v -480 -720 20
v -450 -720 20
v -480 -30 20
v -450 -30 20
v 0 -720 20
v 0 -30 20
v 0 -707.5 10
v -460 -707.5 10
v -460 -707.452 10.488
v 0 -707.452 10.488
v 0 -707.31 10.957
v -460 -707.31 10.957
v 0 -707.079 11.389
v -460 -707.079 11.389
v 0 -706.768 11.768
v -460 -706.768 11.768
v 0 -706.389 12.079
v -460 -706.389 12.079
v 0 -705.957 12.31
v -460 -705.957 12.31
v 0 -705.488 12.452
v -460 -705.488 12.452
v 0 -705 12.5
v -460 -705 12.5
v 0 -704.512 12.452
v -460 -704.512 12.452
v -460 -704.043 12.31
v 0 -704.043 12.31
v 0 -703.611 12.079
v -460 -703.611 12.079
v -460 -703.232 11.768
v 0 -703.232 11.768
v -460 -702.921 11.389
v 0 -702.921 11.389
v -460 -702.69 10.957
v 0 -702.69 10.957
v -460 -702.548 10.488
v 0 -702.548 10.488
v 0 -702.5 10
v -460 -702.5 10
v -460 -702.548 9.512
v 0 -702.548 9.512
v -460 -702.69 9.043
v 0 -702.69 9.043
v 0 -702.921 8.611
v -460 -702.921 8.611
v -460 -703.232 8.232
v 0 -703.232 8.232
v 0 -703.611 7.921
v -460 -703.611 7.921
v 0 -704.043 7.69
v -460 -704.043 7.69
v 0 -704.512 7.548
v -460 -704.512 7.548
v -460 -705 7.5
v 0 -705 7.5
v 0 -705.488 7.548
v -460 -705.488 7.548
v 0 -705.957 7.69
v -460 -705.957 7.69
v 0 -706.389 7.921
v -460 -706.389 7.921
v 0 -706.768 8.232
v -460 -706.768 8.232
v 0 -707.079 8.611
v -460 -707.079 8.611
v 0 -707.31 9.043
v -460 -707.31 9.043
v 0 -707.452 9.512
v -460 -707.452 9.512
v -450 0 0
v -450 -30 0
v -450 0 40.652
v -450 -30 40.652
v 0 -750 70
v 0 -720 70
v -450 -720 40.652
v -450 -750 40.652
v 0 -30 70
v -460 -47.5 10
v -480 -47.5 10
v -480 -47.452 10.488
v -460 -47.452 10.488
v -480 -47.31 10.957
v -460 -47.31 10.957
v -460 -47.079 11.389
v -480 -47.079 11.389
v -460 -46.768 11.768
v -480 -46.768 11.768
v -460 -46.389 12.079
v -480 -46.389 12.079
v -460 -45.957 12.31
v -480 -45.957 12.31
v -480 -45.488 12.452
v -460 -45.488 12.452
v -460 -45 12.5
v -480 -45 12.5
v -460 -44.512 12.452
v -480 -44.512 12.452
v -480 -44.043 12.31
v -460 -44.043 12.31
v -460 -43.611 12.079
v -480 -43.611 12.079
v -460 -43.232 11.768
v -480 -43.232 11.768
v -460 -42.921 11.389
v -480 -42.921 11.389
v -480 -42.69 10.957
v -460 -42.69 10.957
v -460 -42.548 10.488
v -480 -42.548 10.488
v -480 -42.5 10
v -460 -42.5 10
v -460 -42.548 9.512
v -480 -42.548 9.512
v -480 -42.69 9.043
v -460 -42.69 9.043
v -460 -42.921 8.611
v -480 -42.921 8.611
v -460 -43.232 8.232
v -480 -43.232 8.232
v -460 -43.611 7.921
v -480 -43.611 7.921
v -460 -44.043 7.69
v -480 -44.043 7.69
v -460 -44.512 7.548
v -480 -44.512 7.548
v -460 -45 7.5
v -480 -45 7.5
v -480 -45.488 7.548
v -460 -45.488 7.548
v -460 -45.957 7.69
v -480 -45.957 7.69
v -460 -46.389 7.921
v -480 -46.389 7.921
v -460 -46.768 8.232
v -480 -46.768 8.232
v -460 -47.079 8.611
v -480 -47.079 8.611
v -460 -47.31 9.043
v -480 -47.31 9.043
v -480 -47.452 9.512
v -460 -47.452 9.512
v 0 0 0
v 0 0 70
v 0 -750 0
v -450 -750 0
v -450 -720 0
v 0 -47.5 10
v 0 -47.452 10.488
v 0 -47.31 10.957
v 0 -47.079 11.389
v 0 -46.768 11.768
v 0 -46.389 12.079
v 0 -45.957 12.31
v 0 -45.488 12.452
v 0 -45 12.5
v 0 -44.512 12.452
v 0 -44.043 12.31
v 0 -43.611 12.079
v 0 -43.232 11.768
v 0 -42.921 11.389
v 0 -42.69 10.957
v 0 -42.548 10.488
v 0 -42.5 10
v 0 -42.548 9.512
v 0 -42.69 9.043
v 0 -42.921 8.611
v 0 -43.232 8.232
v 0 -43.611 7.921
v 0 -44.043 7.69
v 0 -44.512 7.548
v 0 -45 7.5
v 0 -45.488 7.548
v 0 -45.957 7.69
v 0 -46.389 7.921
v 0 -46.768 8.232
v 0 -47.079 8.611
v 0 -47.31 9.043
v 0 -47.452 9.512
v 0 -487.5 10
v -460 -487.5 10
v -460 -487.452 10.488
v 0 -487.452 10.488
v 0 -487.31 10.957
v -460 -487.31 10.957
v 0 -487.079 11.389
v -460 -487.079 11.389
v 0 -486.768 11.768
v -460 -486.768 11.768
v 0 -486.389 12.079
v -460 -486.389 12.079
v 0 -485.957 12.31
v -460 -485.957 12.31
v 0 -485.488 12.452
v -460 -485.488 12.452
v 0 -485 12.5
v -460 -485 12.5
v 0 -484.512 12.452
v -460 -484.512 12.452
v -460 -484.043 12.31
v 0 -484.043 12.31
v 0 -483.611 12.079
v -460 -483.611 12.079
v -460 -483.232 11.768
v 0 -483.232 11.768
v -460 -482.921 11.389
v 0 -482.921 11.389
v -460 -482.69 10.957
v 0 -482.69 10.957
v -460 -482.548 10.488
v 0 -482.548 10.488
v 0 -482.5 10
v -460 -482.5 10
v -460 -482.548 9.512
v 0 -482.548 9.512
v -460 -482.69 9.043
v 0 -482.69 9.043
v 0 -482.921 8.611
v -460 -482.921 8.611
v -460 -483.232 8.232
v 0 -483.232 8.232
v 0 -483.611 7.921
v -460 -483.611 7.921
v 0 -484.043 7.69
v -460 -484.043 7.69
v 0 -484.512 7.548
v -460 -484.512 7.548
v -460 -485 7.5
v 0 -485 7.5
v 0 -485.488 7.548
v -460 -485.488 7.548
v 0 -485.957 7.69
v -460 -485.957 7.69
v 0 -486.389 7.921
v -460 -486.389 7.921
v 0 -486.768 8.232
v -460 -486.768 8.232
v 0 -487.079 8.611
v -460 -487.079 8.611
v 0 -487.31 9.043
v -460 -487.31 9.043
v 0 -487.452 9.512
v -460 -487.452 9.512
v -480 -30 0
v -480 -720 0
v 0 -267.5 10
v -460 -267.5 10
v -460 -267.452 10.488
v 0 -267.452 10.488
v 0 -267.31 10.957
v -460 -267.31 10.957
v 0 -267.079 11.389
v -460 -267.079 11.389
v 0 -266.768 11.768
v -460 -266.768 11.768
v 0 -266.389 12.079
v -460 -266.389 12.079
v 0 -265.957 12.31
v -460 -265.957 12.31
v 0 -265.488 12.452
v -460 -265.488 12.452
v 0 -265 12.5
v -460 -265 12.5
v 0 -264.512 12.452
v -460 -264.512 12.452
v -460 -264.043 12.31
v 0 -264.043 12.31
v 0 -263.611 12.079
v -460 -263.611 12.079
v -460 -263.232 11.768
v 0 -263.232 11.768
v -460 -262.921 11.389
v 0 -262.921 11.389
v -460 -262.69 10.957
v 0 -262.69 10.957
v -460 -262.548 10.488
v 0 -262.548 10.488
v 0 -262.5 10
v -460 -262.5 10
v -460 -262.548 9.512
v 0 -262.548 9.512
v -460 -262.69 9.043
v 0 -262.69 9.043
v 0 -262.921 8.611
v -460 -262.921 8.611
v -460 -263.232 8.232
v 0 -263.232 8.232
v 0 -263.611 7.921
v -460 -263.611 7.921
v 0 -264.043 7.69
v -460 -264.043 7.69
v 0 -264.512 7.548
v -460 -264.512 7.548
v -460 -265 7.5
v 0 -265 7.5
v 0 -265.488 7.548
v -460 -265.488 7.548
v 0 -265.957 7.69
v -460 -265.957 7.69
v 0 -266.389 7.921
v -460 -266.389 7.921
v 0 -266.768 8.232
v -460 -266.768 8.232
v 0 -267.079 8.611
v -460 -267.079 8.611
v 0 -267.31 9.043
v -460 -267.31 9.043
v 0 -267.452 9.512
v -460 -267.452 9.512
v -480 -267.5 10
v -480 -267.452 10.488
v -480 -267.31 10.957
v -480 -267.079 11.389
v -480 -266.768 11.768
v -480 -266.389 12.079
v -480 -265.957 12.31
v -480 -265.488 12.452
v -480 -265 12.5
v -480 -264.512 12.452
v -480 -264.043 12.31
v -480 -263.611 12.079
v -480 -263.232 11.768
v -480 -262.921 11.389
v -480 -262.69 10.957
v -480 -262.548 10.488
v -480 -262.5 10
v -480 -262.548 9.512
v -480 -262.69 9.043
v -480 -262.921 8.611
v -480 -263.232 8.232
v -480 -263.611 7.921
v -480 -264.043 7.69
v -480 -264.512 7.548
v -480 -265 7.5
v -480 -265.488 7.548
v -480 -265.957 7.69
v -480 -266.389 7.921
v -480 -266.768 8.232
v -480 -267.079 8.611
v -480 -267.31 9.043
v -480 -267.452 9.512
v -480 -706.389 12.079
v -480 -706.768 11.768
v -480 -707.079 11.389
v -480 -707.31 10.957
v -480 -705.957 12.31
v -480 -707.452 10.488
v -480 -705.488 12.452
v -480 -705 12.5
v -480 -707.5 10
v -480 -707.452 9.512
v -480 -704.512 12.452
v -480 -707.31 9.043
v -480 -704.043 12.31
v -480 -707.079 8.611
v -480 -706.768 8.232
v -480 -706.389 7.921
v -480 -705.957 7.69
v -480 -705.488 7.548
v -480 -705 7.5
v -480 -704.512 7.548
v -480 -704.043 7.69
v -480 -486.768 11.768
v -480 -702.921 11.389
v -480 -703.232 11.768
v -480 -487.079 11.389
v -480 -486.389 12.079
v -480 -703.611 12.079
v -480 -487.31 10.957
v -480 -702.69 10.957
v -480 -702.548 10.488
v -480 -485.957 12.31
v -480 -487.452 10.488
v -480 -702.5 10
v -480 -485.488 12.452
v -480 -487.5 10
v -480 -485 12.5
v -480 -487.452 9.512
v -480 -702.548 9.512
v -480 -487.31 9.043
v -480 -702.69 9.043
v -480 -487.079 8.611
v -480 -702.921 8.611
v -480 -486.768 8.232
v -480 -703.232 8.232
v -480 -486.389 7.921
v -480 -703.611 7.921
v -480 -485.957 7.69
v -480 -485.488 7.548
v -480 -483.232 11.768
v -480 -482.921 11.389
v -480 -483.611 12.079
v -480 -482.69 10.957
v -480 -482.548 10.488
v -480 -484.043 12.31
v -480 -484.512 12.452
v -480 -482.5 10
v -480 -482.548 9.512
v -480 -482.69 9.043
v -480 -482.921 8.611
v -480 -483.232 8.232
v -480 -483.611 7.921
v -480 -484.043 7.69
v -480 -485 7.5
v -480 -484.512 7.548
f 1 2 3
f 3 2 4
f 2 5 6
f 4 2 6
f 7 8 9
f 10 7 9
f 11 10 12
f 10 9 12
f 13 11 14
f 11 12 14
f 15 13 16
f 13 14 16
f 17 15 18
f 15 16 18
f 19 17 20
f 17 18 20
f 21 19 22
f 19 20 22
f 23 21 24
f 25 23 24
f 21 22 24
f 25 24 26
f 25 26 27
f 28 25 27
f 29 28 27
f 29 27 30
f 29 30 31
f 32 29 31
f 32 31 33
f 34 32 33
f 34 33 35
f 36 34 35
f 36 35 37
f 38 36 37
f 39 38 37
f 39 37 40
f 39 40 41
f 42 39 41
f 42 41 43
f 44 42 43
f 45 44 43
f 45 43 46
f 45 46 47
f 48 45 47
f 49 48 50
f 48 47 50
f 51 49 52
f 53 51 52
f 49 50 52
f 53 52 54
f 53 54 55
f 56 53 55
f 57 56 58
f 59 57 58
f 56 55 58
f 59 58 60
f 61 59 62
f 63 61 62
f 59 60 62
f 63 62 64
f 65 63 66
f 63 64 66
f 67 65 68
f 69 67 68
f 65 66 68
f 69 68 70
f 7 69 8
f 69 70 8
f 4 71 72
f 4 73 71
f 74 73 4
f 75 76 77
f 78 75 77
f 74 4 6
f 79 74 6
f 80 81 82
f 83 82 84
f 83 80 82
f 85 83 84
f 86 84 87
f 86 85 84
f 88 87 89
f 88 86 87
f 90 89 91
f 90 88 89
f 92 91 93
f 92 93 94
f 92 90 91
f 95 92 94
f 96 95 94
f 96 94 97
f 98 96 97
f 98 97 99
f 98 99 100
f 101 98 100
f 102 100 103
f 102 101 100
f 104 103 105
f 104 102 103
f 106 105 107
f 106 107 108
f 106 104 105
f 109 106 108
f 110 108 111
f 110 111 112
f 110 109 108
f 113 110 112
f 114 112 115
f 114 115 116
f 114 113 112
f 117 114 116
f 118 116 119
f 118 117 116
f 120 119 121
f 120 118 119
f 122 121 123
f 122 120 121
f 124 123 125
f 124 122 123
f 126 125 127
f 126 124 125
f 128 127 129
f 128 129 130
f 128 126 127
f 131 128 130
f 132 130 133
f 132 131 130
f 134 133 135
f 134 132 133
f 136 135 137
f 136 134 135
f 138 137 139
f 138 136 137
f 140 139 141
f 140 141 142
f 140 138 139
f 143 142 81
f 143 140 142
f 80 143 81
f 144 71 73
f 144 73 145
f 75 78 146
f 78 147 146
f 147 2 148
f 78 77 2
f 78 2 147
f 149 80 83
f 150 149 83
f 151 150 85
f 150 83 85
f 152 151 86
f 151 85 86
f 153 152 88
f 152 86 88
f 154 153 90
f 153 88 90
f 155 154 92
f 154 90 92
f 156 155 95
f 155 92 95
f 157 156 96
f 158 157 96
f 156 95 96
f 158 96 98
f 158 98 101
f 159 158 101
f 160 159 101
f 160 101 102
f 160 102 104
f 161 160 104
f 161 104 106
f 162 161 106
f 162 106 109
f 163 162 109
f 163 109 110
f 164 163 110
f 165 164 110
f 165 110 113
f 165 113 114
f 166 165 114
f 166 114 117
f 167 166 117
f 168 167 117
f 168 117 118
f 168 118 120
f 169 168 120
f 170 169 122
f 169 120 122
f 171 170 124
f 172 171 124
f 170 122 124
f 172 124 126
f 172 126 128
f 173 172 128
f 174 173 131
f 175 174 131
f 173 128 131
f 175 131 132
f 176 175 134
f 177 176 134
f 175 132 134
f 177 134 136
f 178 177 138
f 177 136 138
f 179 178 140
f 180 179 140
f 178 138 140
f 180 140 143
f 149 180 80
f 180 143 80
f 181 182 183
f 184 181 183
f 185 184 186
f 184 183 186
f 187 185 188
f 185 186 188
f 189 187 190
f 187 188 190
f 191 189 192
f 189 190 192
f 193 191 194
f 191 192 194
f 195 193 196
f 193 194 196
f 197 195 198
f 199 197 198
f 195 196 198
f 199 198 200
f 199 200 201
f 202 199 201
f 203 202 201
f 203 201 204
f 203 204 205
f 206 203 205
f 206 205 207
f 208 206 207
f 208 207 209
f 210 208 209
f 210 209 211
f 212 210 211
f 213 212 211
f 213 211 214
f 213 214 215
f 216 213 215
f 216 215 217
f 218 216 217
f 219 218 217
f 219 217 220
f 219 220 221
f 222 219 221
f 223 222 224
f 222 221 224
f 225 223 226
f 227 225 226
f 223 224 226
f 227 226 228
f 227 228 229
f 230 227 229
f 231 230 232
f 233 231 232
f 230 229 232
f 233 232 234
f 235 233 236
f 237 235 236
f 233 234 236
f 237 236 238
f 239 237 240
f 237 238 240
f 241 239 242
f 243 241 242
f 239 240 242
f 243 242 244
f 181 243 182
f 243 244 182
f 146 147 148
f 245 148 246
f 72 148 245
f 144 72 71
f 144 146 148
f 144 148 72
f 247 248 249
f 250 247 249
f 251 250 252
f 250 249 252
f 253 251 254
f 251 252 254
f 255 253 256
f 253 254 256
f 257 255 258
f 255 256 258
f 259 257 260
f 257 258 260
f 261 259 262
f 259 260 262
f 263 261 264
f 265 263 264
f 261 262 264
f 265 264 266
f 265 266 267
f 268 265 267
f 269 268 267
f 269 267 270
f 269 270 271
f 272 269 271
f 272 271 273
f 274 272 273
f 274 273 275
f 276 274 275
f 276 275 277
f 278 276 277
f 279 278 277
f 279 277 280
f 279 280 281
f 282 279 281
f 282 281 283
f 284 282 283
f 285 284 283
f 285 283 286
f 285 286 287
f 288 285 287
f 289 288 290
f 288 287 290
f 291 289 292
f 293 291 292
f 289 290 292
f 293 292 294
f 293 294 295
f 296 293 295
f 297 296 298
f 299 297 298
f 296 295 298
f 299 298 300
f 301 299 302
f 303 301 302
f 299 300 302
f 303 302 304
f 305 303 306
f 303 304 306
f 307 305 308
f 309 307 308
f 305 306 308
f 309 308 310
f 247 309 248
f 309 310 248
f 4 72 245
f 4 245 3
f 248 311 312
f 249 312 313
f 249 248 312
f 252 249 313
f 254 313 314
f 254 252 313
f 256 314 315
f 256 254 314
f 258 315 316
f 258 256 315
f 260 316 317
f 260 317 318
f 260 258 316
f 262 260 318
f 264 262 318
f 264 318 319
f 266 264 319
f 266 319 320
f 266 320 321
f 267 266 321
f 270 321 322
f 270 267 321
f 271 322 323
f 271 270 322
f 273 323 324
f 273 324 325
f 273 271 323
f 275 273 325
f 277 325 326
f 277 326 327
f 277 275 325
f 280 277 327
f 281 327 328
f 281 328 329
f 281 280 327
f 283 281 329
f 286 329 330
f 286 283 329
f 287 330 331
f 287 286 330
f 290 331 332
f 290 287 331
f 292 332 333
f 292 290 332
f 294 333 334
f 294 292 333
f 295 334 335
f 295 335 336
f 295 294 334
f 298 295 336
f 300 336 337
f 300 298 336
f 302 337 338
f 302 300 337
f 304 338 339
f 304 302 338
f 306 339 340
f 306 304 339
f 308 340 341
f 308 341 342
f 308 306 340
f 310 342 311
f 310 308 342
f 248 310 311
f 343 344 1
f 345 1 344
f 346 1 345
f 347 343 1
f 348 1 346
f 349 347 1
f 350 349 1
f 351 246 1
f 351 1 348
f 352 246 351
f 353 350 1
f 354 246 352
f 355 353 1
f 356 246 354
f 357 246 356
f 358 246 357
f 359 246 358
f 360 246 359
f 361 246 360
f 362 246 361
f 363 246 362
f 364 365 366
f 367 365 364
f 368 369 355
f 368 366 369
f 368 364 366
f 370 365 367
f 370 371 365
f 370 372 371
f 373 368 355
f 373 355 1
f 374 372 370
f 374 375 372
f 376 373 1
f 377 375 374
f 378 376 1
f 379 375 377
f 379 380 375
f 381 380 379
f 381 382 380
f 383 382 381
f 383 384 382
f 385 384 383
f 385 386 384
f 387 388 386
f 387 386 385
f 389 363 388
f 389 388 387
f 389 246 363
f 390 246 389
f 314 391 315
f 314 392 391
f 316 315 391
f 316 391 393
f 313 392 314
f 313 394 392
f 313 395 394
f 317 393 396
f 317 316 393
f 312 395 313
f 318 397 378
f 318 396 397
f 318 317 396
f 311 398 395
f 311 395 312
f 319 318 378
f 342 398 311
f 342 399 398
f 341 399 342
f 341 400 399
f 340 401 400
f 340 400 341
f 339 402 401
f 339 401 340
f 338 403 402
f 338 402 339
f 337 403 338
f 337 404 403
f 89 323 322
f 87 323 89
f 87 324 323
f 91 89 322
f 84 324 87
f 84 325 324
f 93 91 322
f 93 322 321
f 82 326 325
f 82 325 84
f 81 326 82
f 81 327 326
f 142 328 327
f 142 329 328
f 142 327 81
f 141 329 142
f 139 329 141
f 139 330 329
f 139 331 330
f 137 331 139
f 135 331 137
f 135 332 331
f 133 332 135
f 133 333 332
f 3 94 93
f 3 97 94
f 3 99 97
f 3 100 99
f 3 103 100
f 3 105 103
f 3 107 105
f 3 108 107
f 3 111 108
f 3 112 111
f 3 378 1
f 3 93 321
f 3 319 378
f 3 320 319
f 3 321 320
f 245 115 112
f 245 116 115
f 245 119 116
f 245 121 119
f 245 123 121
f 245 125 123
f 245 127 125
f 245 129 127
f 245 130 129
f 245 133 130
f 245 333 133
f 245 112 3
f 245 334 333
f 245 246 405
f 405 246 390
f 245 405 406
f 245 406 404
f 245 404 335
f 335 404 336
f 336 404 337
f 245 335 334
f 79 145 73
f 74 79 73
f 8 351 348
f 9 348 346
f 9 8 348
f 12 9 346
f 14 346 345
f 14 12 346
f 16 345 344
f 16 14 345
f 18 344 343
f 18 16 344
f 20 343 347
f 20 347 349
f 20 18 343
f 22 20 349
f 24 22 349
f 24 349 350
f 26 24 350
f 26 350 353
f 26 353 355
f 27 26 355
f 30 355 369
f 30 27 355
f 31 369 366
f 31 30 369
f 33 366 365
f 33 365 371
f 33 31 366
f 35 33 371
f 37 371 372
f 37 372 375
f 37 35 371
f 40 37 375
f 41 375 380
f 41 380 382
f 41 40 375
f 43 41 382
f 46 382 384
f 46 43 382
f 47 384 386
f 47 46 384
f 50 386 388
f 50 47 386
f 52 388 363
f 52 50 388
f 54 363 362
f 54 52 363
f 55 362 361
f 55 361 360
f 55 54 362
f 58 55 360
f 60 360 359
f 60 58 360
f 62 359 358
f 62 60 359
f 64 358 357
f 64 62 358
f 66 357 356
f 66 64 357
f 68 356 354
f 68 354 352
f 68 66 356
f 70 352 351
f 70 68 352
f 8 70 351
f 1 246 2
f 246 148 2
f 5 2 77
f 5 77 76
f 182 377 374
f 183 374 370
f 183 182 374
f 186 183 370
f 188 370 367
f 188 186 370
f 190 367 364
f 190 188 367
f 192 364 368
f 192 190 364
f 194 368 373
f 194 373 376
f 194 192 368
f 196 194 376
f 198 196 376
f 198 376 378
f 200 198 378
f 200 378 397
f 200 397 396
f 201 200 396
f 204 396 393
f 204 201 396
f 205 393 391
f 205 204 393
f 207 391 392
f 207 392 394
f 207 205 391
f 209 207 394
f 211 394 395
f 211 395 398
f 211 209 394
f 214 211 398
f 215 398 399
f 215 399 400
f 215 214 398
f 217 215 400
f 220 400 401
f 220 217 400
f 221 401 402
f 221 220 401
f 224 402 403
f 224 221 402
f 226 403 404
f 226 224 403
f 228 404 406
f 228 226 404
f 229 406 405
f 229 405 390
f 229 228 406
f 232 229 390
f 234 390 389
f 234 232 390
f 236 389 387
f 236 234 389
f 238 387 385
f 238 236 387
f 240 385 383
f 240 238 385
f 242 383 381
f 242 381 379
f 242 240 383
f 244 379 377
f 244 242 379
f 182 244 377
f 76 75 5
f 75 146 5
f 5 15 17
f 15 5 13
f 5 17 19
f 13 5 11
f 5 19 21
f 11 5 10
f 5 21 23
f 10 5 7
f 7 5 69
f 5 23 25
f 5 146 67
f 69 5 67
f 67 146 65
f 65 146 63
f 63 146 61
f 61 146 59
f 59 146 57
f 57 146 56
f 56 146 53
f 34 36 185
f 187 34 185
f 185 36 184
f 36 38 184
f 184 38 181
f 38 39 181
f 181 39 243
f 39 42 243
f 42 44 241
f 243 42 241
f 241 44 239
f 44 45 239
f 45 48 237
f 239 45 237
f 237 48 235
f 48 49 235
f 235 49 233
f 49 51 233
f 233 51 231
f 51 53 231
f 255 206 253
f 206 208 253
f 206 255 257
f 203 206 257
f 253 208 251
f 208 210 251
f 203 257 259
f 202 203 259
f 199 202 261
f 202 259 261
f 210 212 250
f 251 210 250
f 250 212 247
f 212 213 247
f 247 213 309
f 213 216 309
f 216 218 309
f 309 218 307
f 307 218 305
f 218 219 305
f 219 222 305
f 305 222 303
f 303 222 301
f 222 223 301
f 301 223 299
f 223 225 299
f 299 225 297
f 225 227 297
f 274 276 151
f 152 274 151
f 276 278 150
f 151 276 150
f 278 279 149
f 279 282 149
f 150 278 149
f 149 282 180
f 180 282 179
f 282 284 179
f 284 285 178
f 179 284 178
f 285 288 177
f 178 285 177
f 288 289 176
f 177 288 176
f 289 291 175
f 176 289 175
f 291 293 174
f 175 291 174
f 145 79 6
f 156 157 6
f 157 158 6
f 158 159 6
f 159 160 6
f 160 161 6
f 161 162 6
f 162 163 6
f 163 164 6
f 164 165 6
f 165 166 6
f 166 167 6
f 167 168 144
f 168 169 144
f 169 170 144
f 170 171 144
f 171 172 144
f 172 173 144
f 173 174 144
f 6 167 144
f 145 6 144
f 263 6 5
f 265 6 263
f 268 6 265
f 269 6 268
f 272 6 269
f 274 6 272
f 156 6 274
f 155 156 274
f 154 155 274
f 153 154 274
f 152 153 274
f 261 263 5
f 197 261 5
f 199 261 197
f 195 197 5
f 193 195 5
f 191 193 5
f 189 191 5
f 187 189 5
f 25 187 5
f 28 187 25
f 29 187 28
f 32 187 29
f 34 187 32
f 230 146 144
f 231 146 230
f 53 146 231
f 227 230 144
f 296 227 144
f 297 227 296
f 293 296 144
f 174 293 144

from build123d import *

# Parameters (mm, degrees)
F0_W      = 460
F0_H      = 750
F1_DEPTH  = 20
F3_D      = 5
F4_W      = 460
F4_H      = 30
F5_DEPTH  = 50
F7_DEPTH  = 750
F8_W      = 30
F8_H      = 40
F9_DEPTH  = 10
F10_DEPTH = 25
F11_DEPTH = 20


with BuildPart() as f1:
    # F0 (on Top) → F1 (new body)
    with BuildSketch(Plane.XY):
        with Locations((-230, -375)):
            Rectangle(F0_W, F0_H)
    extrude(amount=F1_DEPTH)

    # F3 (through all)
    with Locations(Plane.YZ):
        with Locations((-705, 10), (-485, 10), (-265, 10), (-45, 10)):
            Hole(F3_D / 2)

    # F4 (on face) → F5 (join)
    with BuildSketch(Plane.XY.offset(20)):
        with Locations((-230, -735)):
            Rectangle(F4_W, F4_H)
        with Locations((-230, -15)):
            Rectangle(F4_W, F4_H)
    extrude(amount=F5_DEPTH)

    # F6 (on face) → F7 (cut)
    with BuildSketch(Plane(origin=(0, 0, 0), x_dir=(-1, 0, 0), z_dir=(0, 1, 0))):
        Polygon((0, 70), (460, 40), (460, 70), align=None)
    extrude(amount=-F7_DEPTH, mode=Mode.SUBTRACT)

    # F8 (on face) → F9 (cut)
    with BuildSketch(Plane(origin=(-460, 0, 0), x_dir=(0, -1, 0), z_dir=(-1, 0, 0))):
        with Locations((15, 20)):
            Rectangle(F8_W, F8_H)
        with Locations((735, 20)):
            Rectangle(F8_W, F8_H)
    extrude(amount=-F9_DEPTH, mode=Mode.SUBTRACT)

    # F10 (cut): faces of the model
    f10_faces = [f1.faces().sort_by_distance(p)[0] for p in [
        (-455, -15, 40),
        (-455, -735, 40),
    ]]
    extrude(f10_faces, amount=-F10_DEPTH, mode=Mode.SUBTRACT)

    # F11 (add): a face of the model
    f11_faces = [f1.faces().sort_by_distance(p)[0] for p in [
        (-460, -375, 10),
    ]]
    extrude(f11_faces, amount=F11_DEPTH)


solid = f1.part
